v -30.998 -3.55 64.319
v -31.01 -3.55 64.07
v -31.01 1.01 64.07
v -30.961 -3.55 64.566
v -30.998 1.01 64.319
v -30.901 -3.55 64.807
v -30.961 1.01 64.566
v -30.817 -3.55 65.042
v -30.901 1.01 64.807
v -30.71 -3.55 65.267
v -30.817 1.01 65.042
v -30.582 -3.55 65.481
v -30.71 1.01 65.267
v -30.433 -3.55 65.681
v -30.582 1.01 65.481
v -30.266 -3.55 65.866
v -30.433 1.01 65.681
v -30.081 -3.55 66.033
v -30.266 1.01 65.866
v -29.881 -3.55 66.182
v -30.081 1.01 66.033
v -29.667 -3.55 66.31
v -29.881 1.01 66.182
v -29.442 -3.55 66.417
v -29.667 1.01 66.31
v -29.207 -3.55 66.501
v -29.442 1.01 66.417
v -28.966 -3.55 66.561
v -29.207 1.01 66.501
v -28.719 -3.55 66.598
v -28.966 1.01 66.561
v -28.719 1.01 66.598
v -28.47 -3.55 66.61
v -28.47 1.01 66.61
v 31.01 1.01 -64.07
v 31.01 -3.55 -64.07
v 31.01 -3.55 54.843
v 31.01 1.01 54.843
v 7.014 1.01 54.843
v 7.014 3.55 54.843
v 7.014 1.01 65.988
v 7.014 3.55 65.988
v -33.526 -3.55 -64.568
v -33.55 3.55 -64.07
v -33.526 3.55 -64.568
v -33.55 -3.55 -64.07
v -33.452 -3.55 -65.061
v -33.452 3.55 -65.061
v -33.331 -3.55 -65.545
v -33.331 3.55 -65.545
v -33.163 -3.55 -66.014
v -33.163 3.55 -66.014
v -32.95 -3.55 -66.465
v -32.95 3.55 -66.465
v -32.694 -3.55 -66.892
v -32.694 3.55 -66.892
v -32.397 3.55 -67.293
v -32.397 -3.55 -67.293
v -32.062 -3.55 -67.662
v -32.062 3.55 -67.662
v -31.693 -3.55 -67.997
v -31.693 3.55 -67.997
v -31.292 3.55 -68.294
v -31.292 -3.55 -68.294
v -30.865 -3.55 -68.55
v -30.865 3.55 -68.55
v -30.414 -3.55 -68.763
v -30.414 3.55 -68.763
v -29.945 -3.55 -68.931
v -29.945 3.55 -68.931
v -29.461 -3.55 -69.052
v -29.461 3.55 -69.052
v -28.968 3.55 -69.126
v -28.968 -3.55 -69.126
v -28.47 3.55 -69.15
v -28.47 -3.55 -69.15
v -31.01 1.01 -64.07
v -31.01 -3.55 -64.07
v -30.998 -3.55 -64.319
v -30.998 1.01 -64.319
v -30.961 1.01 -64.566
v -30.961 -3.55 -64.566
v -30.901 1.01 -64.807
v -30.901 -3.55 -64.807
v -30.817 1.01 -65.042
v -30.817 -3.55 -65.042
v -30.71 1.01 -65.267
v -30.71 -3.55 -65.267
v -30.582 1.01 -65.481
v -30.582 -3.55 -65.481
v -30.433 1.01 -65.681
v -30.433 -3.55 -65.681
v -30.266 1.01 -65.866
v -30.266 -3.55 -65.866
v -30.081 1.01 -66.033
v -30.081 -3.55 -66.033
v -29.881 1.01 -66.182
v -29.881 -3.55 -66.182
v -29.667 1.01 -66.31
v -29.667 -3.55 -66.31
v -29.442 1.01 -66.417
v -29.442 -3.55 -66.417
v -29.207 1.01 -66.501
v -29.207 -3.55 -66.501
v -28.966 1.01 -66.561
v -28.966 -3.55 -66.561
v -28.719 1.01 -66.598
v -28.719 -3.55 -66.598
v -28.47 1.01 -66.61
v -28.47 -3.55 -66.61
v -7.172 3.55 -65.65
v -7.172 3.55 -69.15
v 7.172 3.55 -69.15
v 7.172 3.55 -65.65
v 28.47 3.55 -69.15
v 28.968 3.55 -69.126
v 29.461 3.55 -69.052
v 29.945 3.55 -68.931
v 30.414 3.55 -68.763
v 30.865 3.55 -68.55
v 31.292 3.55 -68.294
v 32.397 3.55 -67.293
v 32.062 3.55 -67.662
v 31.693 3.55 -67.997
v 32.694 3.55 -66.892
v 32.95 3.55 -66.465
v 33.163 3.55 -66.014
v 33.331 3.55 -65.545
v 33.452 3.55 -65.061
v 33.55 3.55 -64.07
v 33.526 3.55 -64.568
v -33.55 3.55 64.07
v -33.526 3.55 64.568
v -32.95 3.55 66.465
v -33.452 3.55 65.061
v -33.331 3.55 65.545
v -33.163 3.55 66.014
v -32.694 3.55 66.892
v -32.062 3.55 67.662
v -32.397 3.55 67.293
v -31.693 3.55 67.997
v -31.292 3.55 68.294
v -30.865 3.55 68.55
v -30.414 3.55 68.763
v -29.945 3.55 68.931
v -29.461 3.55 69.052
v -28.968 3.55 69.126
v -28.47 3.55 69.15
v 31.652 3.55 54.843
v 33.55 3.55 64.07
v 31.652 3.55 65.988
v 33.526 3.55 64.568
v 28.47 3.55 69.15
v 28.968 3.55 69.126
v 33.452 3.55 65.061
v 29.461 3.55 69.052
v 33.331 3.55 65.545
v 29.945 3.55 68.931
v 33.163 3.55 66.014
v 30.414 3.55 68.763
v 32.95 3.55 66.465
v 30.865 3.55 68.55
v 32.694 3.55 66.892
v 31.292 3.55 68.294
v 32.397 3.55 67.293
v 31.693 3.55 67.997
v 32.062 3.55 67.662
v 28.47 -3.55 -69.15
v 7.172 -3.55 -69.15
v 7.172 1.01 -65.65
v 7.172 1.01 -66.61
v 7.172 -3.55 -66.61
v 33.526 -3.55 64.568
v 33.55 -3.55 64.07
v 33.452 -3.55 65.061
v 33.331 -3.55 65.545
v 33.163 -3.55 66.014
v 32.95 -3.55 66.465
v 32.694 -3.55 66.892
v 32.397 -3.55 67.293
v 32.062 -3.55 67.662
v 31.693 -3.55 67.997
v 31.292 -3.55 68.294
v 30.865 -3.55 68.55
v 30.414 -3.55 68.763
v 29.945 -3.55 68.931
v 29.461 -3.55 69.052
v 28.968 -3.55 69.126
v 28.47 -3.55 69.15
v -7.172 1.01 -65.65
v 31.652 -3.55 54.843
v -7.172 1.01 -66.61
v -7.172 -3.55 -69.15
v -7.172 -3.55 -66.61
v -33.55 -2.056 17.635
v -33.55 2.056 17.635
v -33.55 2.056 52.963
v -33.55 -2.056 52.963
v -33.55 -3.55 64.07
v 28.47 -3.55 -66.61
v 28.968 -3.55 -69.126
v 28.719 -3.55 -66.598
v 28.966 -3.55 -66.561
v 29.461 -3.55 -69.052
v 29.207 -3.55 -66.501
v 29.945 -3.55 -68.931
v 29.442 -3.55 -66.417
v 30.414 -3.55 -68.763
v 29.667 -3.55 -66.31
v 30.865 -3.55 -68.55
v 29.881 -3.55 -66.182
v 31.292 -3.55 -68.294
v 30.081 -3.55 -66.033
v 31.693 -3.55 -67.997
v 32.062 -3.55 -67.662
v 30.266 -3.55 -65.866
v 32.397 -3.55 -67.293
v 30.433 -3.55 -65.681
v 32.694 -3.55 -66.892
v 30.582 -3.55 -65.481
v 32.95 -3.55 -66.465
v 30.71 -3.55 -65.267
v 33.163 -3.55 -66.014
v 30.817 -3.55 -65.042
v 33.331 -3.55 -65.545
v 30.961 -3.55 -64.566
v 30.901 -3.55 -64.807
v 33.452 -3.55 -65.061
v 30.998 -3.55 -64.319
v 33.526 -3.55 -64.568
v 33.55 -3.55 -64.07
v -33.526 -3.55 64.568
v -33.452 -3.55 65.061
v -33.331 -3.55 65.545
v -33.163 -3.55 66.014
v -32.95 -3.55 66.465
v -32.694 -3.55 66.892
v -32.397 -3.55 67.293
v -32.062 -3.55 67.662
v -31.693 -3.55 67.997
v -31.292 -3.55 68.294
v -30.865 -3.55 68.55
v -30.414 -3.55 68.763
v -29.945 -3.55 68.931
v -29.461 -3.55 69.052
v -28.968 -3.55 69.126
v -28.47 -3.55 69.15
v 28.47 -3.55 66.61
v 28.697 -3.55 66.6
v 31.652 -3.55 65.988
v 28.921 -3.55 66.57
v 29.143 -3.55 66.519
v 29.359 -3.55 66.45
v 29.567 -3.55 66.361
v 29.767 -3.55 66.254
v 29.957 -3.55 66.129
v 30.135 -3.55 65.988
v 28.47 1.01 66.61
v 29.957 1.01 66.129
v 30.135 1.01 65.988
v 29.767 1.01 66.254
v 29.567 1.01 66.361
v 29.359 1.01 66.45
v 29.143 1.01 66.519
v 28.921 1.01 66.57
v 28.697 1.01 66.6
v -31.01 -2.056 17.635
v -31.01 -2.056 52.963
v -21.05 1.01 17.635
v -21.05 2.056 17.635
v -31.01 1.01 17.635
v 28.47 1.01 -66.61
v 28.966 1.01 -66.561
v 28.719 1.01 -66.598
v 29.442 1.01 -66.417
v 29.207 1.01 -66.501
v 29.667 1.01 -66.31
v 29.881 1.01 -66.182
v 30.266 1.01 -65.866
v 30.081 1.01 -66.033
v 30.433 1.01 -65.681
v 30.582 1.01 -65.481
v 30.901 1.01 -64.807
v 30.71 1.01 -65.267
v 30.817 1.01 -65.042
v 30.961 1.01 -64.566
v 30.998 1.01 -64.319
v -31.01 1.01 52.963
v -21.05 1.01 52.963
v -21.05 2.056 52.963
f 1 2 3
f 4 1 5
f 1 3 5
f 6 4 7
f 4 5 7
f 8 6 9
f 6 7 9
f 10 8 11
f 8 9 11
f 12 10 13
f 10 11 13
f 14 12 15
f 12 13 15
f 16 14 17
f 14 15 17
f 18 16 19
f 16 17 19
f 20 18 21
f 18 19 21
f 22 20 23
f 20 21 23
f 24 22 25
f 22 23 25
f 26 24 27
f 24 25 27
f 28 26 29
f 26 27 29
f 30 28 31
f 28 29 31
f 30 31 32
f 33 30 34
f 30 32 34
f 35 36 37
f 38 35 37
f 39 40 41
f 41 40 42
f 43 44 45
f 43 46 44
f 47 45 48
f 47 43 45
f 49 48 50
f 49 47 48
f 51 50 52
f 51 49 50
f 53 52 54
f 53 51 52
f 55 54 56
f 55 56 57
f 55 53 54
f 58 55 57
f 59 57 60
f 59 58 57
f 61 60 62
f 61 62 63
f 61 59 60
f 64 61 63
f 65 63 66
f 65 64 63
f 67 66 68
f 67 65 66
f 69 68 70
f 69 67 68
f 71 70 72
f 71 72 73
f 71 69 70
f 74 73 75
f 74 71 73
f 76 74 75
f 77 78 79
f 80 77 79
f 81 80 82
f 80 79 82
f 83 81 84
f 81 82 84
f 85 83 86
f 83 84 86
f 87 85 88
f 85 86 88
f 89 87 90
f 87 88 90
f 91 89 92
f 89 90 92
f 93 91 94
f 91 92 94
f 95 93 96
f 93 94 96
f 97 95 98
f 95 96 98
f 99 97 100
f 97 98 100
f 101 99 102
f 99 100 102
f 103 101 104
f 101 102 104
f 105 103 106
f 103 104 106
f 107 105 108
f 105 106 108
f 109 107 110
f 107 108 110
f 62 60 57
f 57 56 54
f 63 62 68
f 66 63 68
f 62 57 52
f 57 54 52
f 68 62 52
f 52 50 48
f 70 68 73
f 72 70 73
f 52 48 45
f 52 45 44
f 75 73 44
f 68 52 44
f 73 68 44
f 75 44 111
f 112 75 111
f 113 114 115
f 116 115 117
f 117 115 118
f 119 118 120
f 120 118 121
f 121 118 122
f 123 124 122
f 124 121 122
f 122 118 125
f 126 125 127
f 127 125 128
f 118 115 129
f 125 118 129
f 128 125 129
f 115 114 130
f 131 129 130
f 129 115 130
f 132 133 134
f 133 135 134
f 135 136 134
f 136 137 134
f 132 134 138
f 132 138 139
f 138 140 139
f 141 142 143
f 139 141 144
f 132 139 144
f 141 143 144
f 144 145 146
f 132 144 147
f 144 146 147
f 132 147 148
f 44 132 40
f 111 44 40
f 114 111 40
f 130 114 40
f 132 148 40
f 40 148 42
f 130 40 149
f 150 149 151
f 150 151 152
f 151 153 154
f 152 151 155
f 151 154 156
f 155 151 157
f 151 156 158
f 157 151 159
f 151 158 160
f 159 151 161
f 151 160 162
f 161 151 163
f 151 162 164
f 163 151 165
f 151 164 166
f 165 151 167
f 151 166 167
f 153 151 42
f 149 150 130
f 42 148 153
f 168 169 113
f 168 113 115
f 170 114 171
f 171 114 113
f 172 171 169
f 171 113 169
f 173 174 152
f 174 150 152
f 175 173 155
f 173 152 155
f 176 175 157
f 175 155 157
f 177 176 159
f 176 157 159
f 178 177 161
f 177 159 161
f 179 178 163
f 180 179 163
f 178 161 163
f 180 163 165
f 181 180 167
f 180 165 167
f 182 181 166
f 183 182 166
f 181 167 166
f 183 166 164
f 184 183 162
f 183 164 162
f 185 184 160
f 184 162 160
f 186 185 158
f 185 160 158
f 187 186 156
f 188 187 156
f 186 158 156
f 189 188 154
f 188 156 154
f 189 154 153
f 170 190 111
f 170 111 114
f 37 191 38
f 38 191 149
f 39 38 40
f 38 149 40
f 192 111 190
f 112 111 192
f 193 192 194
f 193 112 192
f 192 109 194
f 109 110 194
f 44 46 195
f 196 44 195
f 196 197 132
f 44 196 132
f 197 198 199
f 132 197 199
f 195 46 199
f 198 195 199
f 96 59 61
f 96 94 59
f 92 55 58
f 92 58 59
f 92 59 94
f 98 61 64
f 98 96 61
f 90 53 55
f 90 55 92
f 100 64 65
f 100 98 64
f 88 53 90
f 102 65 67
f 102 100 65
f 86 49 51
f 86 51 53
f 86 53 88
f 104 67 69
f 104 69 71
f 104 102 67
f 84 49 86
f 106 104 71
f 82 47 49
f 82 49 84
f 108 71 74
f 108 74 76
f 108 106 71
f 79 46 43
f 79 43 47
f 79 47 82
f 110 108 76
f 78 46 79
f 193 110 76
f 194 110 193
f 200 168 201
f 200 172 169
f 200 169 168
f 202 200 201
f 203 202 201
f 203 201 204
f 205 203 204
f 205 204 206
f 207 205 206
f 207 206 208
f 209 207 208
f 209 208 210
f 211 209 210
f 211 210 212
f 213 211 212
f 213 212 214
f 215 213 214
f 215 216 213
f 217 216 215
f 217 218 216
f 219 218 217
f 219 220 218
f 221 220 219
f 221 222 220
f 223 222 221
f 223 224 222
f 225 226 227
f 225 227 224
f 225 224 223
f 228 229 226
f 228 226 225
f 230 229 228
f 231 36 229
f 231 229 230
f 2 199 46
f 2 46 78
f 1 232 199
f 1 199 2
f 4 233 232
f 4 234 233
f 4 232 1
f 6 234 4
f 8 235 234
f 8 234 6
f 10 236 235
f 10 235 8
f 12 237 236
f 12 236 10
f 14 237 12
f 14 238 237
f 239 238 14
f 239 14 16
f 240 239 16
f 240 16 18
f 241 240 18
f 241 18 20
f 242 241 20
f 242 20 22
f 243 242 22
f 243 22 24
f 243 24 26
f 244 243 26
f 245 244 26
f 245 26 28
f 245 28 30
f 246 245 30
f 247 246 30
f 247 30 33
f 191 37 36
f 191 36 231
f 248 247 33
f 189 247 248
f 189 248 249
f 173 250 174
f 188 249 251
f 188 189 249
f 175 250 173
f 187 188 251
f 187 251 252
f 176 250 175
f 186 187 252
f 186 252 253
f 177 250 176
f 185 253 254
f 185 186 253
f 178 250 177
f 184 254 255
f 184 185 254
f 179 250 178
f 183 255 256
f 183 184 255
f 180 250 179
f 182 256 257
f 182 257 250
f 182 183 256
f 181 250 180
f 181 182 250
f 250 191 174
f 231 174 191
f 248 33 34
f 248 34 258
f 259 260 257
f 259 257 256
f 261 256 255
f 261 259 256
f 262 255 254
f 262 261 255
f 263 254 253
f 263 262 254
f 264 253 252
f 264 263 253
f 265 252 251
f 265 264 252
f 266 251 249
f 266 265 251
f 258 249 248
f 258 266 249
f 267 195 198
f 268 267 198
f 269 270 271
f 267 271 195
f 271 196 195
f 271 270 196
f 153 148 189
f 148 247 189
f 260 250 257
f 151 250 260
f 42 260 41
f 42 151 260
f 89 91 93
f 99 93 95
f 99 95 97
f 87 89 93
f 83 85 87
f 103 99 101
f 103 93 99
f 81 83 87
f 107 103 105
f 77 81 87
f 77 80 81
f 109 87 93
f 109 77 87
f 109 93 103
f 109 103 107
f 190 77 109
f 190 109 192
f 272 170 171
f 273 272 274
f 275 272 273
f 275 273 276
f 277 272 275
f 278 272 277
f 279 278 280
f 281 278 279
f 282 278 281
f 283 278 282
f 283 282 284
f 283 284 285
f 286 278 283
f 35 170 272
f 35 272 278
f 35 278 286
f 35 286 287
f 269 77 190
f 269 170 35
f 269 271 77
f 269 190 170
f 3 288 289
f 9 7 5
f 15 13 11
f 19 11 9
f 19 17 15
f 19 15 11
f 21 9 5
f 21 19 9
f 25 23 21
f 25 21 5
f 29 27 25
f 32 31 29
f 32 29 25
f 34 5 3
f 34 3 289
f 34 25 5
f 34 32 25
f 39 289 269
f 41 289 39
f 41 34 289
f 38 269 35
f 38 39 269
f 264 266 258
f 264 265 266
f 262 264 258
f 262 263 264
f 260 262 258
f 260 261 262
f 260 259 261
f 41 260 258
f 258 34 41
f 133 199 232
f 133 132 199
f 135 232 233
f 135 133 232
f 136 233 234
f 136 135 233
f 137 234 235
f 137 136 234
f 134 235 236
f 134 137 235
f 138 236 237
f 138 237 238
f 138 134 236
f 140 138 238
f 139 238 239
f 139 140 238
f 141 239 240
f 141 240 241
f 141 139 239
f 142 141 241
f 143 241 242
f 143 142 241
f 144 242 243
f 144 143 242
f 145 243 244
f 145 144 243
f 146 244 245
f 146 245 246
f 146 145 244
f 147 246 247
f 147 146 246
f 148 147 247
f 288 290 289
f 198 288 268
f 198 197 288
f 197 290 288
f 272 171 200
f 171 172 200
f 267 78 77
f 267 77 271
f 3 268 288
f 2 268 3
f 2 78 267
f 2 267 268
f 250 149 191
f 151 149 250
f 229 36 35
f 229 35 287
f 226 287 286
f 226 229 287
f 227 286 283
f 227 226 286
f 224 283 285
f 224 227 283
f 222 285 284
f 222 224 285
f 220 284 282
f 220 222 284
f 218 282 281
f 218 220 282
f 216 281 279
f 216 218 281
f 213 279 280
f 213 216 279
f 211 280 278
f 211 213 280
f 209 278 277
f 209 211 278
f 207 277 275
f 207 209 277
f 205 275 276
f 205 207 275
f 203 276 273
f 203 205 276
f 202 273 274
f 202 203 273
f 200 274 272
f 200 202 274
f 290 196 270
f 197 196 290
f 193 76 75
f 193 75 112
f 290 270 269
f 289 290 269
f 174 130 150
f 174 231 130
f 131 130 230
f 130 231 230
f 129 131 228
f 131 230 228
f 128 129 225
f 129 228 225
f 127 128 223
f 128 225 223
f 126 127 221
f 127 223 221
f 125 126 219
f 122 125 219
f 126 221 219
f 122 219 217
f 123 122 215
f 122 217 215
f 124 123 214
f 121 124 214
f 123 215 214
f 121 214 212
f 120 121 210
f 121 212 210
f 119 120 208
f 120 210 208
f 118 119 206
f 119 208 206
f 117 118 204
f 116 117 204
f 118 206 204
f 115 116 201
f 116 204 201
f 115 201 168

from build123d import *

# Parameters (mm, degrees)
F0_W     = 67.1
F0_H     = 138.3
F1_DEPTH = 3.55
F2_R     = 5.08
F3_T     = -2.54
F4_W     = 24.637904
F4_H     = 11.145718
F5_DEPTH = 12.5
F6_W     = 14.344266
F6_H     = 7.1
F7_DEPTH = 3.5
F8_W     = 4.111376
F8_H     = 35.32717
F9_DEPTH = 12.5


with BuildPart() as f1:
    # F0 (on Front) → F1 (new body, symmetric)
    with BuildSketch(Plane.XZ):
        Rectangle(F0_W, F0_H)
    extrude(amount=F1_DEPTH, both=True)

    # F2
    f2_edges = [f1.edges().sort_by_distance(p)[0] for p in [
        (-33.55, 0, 69.15),
        (33.55, 0, 69.15),
        (33.55, 0, -69.15),
        (-33.55, 0, -69.15),
    ]]
    fillet(f2_edges, radius=F2_R)

    # F3
    f3_openings = [f1.faces().sort_by_distance(p)[0] for p in [
        (0, -3.55, 0),
    ]]
    offset(amount=F3_T, openings=f3_openings)

    # F4 (on face) → F5 (cut, symmetric)
    with BuildSketch(Plane(origin=(0, 3.55, 0), x_dir=(-1, 0, 0), z_dir=(0, 1, 0))):
        with Locations((-19.333094, 60.415514)):
            Rectangle(F4_W, F4_H)
    extrude(amount=F5_DEPTH, both=True, mode=Mode.SUBTRACT)

    # F6 (on face) → F7 (cut, symmetric)
    with BuildSketch(Plane(origin=(0, 0, -69.15), x_dir=(1, 0, 0), z_dir=(0, 0, -1))):
        Rectangle(F6_W, F6_H)
    extrude(amount=F7_DEPTH, both=True, mode=Mode.SUBTRACT)

    # F8 (on face) → F9 (cut, symmetric)
    with BuildSketch(Plane(origin=(-33.55, 0, 0), x_dir=(0, -1, 0), z_dir=(-1, 0, 0))):
        with Locations((0, 35.298977)):
            Rectangle(F8_W, F8_H)
    extrude(amount=F9_DEPTH, both=True, mode=Mode.SUBTRACT)


solid = f1.part
